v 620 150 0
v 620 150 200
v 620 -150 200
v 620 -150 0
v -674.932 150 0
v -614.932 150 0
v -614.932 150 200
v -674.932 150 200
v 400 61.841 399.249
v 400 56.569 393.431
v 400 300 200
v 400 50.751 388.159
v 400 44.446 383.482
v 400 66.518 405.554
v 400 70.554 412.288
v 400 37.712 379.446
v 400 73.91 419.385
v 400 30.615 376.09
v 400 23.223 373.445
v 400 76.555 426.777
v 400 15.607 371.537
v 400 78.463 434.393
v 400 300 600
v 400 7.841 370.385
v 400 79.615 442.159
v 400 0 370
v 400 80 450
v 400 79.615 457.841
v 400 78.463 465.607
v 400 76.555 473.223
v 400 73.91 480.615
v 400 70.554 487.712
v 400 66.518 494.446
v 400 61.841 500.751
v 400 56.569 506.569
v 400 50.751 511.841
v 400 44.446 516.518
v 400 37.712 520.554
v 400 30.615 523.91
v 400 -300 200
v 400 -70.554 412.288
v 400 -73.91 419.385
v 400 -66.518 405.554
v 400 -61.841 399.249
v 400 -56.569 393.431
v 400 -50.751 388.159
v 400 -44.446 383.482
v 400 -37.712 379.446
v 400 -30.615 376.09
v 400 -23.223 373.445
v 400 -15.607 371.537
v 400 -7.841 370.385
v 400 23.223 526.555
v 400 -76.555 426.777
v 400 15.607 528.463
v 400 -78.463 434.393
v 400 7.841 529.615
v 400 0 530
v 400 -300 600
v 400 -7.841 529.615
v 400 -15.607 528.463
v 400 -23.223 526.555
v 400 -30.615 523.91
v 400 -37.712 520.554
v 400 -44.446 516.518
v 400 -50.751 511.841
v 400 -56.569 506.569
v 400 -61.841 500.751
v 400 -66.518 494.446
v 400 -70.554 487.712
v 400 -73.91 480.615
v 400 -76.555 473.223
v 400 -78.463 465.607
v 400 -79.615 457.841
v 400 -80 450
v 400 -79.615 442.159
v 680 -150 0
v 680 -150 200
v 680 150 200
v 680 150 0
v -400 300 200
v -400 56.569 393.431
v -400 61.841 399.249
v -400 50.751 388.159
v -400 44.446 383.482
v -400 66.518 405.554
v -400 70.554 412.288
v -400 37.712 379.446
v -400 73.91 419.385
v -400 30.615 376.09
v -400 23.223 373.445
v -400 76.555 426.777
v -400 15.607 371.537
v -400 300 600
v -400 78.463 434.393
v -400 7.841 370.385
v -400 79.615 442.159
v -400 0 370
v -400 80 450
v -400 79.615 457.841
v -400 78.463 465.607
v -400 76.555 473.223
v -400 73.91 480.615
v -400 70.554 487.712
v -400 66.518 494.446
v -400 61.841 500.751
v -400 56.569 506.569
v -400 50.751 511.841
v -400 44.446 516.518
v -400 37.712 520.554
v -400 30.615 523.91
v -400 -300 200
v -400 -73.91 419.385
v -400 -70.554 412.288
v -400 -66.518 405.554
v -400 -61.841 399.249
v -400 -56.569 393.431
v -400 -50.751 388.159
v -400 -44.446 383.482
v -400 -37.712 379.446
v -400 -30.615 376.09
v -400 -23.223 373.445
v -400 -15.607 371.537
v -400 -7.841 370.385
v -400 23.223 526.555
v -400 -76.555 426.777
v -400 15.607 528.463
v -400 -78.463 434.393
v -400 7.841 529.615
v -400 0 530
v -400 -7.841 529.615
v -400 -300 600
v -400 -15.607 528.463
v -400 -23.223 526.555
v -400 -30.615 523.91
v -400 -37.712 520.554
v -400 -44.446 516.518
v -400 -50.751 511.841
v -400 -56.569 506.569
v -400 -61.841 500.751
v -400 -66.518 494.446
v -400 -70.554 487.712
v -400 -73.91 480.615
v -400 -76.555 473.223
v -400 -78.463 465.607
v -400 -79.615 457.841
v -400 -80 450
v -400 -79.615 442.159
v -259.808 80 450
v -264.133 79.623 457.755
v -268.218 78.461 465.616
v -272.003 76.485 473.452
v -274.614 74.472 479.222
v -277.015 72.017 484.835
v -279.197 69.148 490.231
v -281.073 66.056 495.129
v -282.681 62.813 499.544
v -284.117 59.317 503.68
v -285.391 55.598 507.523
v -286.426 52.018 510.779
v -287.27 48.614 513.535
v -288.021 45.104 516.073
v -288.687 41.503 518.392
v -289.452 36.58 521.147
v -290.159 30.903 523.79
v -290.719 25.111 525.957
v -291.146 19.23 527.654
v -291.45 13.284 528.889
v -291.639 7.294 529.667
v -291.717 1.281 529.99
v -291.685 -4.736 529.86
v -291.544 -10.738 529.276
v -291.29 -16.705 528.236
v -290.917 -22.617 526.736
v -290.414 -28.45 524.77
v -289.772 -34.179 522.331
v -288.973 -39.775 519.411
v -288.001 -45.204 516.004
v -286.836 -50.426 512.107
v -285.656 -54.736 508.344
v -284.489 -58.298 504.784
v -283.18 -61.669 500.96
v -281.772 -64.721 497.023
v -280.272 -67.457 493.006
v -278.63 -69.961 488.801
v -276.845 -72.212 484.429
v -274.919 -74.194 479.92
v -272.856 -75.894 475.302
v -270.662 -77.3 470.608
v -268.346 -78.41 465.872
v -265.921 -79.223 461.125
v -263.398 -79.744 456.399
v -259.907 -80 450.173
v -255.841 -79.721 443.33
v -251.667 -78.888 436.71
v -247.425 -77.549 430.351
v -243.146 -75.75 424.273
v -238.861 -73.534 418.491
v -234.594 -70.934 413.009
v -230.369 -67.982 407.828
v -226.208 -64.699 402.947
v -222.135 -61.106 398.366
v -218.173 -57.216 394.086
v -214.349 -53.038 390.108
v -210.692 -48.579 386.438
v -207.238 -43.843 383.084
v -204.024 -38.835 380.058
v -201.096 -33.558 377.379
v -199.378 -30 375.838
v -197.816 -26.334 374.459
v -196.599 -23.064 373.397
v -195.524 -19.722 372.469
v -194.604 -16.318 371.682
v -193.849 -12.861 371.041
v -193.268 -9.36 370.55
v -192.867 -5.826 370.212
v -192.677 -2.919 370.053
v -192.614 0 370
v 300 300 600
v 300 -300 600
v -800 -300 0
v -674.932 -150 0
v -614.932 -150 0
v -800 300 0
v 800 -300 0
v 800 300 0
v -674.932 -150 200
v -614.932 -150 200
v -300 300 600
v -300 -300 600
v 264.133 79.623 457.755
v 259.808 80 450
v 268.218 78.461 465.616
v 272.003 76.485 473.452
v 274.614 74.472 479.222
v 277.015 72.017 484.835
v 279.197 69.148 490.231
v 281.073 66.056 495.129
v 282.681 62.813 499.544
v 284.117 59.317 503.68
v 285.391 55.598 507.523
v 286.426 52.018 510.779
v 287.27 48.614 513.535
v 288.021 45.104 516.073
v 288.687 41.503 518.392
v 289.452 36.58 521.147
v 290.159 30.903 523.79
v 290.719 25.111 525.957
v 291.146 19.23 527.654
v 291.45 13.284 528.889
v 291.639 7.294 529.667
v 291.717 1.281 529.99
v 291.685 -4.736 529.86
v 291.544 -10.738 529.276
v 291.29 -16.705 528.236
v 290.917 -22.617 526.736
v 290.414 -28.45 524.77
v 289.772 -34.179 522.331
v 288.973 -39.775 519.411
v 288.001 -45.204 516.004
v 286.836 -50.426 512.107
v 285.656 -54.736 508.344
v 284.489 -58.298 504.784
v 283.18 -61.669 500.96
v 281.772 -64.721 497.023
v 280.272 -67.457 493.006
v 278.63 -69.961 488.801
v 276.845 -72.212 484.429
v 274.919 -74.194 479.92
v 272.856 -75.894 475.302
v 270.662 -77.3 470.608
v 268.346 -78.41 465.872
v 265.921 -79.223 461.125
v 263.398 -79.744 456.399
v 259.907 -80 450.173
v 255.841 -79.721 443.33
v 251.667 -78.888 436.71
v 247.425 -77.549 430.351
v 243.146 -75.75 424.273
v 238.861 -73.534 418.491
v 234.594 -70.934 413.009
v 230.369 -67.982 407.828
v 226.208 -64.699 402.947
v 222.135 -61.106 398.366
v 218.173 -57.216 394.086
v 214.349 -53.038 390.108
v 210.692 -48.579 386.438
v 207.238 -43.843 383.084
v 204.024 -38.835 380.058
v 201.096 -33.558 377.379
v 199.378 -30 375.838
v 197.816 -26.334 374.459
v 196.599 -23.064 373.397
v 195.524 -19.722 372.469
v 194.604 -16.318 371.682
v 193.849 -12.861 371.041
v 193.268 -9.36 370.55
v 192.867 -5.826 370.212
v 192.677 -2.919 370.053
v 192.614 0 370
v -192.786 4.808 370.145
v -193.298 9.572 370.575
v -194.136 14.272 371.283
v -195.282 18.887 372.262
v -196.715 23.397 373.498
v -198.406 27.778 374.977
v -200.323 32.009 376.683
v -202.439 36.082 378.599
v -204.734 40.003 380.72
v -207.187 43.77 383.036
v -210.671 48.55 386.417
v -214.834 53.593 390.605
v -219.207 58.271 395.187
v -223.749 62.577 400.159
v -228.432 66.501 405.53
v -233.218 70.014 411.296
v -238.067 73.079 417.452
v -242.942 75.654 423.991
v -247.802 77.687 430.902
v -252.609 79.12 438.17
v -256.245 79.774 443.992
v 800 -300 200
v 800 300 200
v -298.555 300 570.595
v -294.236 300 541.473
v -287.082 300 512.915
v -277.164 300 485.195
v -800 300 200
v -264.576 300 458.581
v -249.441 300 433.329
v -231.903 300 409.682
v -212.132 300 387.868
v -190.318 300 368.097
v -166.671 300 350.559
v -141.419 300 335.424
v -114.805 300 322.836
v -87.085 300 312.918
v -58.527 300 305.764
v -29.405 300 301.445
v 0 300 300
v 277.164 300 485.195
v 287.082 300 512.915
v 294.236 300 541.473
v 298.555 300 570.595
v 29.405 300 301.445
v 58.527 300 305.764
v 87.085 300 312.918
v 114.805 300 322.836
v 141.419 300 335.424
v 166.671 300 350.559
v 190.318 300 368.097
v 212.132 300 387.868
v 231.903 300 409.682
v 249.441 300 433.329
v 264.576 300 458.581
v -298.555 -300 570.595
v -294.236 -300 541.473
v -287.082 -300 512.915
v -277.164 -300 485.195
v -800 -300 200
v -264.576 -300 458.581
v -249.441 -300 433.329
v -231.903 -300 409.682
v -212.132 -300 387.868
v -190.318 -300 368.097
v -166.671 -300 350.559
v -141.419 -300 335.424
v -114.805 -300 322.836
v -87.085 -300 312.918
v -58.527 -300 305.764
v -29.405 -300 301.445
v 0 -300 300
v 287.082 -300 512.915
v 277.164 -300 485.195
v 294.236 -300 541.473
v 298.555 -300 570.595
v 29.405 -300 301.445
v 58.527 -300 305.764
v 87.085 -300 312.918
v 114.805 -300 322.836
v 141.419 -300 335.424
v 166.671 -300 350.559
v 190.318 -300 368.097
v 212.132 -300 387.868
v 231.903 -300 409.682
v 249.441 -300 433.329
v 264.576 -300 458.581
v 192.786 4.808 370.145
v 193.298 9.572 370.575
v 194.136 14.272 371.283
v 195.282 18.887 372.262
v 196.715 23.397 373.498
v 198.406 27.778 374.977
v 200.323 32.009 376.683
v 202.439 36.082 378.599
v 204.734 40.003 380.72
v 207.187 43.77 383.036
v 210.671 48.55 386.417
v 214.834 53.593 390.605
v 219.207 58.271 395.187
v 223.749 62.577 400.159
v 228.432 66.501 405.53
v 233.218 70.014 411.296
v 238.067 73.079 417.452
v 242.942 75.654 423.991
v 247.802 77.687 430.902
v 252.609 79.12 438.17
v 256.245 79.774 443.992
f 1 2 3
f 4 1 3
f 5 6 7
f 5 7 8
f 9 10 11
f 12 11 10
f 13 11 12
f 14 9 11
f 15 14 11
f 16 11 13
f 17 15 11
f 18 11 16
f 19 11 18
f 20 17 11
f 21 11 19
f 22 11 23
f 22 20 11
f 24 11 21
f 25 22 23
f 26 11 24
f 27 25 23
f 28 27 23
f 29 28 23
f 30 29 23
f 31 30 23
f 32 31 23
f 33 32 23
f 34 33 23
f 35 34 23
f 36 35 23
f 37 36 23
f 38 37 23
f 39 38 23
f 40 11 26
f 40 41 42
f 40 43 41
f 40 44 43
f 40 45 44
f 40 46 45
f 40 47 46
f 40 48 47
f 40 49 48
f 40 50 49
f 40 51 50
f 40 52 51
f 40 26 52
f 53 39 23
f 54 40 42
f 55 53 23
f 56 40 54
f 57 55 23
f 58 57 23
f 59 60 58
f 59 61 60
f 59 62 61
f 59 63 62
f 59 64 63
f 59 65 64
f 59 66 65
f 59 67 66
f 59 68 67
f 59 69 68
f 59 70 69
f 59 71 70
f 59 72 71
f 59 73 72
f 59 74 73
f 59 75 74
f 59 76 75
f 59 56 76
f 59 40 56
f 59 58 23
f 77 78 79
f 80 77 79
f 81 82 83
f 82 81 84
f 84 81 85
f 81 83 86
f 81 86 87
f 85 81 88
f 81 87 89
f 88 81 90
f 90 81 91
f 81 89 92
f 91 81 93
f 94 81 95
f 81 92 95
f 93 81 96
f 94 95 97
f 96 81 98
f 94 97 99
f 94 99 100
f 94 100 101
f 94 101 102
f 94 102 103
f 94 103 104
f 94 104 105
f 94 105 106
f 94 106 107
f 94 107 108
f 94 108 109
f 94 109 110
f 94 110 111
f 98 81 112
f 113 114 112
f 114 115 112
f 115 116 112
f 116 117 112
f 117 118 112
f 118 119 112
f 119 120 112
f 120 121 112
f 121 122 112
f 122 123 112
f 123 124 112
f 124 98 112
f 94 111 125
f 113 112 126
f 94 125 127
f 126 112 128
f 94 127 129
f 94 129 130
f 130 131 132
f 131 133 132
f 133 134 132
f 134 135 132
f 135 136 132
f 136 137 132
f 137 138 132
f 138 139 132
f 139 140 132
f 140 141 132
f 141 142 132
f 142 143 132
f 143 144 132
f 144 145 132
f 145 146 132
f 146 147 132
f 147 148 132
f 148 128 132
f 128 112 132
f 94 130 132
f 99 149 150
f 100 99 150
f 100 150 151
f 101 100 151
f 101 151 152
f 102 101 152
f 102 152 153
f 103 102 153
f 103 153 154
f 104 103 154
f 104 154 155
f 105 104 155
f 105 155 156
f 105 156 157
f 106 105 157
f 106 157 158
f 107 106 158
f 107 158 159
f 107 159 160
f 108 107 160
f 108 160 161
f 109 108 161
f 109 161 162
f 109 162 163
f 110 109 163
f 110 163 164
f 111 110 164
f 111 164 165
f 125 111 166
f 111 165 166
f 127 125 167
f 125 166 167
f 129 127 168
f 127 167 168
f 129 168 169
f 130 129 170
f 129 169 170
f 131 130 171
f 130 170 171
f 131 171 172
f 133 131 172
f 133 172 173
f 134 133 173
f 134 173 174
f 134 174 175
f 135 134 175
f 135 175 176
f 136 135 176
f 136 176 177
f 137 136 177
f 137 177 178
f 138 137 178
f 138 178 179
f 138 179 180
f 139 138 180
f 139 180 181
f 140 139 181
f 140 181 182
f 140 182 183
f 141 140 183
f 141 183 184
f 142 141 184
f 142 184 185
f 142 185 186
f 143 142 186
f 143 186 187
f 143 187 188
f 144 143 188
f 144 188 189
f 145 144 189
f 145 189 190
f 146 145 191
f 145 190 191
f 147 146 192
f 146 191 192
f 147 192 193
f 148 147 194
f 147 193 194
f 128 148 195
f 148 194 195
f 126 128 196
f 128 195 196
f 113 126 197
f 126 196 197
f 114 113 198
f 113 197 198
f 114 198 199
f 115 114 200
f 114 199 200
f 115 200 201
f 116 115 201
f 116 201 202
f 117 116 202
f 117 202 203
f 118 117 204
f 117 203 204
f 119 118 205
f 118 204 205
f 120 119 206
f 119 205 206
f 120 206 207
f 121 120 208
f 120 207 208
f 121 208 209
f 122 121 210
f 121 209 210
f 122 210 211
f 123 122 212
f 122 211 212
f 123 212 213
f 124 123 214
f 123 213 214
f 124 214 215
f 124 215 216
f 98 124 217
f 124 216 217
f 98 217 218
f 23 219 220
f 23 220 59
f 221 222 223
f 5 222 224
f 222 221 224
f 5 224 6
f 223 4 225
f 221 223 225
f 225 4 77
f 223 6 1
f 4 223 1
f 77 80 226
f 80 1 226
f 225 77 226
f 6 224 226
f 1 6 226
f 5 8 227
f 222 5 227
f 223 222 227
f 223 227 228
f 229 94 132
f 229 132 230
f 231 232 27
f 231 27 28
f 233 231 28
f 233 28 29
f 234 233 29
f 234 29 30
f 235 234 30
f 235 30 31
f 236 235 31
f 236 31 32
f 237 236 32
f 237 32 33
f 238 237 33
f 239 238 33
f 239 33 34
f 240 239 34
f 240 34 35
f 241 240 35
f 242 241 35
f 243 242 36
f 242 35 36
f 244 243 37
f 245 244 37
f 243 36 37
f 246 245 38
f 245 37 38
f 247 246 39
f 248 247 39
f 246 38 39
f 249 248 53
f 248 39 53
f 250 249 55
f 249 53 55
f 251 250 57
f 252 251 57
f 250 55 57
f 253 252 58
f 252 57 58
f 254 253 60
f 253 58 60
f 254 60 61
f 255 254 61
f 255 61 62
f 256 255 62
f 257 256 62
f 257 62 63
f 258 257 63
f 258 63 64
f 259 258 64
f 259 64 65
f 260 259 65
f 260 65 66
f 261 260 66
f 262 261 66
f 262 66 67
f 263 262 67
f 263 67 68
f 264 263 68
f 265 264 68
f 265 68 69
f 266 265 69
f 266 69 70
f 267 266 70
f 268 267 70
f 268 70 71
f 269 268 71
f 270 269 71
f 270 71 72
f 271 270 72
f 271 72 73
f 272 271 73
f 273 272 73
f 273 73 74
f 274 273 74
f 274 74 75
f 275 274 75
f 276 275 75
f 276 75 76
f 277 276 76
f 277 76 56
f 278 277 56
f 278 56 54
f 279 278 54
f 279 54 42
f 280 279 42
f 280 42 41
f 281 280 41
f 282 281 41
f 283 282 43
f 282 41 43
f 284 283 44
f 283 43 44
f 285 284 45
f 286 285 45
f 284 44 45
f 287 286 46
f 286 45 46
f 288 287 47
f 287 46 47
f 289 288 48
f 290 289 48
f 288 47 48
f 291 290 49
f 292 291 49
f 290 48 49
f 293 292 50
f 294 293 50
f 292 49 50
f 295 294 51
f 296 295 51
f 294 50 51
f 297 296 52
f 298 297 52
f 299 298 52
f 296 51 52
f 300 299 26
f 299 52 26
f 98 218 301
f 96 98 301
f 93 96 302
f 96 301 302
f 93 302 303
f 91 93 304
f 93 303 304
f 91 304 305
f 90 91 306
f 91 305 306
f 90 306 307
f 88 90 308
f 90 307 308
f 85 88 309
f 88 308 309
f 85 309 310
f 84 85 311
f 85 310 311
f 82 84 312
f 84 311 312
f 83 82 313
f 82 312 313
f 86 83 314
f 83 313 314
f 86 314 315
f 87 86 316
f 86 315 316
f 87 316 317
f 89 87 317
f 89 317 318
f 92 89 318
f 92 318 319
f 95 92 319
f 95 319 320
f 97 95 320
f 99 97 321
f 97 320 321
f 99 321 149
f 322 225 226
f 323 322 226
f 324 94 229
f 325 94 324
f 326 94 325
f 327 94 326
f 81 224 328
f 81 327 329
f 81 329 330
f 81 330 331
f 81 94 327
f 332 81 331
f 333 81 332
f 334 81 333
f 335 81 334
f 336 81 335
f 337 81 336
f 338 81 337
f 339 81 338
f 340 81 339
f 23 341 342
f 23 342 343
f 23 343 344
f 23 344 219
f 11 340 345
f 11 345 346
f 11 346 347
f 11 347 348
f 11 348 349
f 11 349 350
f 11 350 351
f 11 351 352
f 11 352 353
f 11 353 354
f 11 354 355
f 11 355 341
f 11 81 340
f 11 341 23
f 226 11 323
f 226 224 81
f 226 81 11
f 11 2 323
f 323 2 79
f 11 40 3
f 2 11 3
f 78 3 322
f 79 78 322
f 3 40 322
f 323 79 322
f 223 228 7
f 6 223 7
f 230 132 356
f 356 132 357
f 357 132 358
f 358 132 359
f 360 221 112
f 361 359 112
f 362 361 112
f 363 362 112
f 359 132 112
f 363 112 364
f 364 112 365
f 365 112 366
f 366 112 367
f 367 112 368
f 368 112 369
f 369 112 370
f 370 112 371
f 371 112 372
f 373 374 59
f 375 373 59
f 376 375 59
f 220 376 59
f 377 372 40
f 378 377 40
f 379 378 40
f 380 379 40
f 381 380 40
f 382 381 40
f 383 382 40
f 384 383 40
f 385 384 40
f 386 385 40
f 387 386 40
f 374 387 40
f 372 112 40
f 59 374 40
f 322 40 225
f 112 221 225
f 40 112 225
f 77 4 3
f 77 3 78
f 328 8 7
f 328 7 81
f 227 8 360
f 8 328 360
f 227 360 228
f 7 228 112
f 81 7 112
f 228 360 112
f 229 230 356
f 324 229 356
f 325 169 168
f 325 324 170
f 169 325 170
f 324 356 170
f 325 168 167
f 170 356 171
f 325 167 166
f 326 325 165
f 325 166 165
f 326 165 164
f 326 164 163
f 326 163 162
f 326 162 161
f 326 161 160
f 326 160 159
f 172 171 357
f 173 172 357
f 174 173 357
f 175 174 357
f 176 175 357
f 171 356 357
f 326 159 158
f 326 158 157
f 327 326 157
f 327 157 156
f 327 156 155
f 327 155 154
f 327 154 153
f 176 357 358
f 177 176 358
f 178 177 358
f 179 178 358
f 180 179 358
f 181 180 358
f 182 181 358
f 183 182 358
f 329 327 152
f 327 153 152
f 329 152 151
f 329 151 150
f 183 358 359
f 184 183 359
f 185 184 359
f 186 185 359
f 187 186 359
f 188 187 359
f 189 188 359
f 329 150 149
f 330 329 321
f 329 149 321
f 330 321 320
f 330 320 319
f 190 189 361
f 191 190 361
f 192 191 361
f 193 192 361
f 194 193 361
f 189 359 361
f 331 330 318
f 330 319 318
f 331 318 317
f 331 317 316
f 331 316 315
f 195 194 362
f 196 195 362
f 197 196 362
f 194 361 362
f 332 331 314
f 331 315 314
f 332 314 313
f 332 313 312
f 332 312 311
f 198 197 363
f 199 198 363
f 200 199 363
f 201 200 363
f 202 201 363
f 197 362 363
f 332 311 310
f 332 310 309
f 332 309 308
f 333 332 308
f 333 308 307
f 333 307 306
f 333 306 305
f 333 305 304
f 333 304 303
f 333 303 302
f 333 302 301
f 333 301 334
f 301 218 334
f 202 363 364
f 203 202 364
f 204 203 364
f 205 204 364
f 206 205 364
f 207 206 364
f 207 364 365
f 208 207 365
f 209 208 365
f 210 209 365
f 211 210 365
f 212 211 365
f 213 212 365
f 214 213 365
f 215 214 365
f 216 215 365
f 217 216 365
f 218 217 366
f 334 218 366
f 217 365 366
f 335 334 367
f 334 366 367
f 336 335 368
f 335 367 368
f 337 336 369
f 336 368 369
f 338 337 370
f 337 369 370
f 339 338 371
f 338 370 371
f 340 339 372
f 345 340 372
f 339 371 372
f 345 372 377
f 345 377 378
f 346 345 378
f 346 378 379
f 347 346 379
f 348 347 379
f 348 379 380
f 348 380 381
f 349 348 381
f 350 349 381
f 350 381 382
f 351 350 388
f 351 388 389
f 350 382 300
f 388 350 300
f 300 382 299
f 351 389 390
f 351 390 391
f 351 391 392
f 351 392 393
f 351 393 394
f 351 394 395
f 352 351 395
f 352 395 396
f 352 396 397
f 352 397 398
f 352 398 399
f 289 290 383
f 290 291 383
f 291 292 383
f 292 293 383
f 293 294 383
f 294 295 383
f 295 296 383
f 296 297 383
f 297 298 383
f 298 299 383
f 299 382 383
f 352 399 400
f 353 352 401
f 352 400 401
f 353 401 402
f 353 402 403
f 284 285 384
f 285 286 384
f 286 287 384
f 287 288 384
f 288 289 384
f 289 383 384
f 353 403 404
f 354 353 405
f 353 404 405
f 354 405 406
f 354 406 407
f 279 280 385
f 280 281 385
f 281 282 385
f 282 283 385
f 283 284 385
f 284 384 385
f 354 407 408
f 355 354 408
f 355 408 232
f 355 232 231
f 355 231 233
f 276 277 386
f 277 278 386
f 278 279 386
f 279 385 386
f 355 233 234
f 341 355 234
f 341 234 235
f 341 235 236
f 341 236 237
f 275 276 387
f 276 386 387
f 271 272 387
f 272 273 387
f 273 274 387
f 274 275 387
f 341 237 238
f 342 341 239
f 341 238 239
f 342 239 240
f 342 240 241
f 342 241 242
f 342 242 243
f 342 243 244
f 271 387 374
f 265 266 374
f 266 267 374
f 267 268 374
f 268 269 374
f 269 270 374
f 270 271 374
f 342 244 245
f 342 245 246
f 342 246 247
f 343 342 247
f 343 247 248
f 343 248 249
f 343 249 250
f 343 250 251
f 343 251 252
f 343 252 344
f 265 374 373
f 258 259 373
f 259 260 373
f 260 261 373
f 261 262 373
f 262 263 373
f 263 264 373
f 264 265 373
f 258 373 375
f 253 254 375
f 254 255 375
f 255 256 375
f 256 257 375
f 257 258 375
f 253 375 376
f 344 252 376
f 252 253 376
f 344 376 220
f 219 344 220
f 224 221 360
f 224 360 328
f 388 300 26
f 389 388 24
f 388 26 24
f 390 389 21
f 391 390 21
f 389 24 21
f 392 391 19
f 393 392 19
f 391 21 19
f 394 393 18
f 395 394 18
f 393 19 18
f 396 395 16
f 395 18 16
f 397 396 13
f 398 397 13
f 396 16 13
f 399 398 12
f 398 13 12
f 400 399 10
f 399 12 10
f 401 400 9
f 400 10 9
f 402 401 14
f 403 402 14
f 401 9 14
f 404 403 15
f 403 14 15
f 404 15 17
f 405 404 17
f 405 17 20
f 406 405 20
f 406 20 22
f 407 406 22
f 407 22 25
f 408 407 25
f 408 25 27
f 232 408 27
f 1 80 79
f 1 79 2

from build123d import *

# Parameters (mm, degrees)
F0_W      = 1600
F0_H      = 600
F1_DEPTH  = 600
F3_DEPTH  = 600.001
F5_W      = 400
F5_H      = 400
F6_DEPTH  = 600.001
F7_W      = 400
F7_H      = 400
F8_DEPTH  = 600.001
F10_DEPTH = 1400
F12_DEPTH = 200.001
F14_DEPTH = 600.001


with BuildPart() as f1:
    # F0 (on Top) → F1 (new body)
    with BuildSketch(Plane.XY):
        Rectangle(F0_W, F0_H)
    extrude(amount=F1_DEPTH)

    # F2 (on face) → F3 (cut, through all)
    with BuildSketch(Plane.XZ.offset(300)):
        with BuildLine():
            ThreePointArc((-300, 600), (0, 300), (300, 600))
            Line((300, 600), (-300, 600))
        make_face()
    extrude(amount=-F3_DEPTH, mode=Mode.SUBTRACT)

    # F5 (on face) → F6 (cut, through all)
    with BuildSketch(Plane.XZ.offset(300)):
        with Locations((600, 400)):
            Rectangle(F5_W, F5_H)
    extrude(amount=-F6_DEPTH, mode=Mode.SUBTRACT)

    # F7 (on face) → F8 (cut, through all)
    with BuildSketch(Plane.XZ.offset(300)):
        with Locations((-600, 400)):
            Rectangle(F7_W, F7_H)
    extrude(amount=-F8_DEPTH, mode=Mode.SUBTRACT)

    # F9 (on face) → F10 (cut)
    with BuildSketch(Plane.YZ.offset(400)):
        with BuildLine():
            ThreePointArc((80, 450), (-56.568542, 506.568542), (0, 370))
            ThreePointArc((0, 370), (56.568542, 393.431458), (80, 450))
        make_face()
    extrude(amount=-F10_DEPTH, mode=Mode.SUBTRACT)

    # F11 (on face) → F12 (cut, through all)
    with BuildSketch(Plane.XY.offset(200)):
        Polygon((680, -150), (680, 0), (680, 150), (620, 150), (620, -150), align=None)
    extrude(amount=-F12_DEPTH, mode=Mode.SUBTRACT)

    # F13 (on face) → F14 (cut, through all)
    with BuildSketch(Plane.XY.offset(600)):
        Polygon((-674.93165, 0), (-674.93165, -150), (-614.93165, -150), (-614.93165, 150), (-674.93165, 150), align=None)
    extrude(amount=-F14_DEPTH, mode=Mode.SUBTRACT)


solid = f1.part
